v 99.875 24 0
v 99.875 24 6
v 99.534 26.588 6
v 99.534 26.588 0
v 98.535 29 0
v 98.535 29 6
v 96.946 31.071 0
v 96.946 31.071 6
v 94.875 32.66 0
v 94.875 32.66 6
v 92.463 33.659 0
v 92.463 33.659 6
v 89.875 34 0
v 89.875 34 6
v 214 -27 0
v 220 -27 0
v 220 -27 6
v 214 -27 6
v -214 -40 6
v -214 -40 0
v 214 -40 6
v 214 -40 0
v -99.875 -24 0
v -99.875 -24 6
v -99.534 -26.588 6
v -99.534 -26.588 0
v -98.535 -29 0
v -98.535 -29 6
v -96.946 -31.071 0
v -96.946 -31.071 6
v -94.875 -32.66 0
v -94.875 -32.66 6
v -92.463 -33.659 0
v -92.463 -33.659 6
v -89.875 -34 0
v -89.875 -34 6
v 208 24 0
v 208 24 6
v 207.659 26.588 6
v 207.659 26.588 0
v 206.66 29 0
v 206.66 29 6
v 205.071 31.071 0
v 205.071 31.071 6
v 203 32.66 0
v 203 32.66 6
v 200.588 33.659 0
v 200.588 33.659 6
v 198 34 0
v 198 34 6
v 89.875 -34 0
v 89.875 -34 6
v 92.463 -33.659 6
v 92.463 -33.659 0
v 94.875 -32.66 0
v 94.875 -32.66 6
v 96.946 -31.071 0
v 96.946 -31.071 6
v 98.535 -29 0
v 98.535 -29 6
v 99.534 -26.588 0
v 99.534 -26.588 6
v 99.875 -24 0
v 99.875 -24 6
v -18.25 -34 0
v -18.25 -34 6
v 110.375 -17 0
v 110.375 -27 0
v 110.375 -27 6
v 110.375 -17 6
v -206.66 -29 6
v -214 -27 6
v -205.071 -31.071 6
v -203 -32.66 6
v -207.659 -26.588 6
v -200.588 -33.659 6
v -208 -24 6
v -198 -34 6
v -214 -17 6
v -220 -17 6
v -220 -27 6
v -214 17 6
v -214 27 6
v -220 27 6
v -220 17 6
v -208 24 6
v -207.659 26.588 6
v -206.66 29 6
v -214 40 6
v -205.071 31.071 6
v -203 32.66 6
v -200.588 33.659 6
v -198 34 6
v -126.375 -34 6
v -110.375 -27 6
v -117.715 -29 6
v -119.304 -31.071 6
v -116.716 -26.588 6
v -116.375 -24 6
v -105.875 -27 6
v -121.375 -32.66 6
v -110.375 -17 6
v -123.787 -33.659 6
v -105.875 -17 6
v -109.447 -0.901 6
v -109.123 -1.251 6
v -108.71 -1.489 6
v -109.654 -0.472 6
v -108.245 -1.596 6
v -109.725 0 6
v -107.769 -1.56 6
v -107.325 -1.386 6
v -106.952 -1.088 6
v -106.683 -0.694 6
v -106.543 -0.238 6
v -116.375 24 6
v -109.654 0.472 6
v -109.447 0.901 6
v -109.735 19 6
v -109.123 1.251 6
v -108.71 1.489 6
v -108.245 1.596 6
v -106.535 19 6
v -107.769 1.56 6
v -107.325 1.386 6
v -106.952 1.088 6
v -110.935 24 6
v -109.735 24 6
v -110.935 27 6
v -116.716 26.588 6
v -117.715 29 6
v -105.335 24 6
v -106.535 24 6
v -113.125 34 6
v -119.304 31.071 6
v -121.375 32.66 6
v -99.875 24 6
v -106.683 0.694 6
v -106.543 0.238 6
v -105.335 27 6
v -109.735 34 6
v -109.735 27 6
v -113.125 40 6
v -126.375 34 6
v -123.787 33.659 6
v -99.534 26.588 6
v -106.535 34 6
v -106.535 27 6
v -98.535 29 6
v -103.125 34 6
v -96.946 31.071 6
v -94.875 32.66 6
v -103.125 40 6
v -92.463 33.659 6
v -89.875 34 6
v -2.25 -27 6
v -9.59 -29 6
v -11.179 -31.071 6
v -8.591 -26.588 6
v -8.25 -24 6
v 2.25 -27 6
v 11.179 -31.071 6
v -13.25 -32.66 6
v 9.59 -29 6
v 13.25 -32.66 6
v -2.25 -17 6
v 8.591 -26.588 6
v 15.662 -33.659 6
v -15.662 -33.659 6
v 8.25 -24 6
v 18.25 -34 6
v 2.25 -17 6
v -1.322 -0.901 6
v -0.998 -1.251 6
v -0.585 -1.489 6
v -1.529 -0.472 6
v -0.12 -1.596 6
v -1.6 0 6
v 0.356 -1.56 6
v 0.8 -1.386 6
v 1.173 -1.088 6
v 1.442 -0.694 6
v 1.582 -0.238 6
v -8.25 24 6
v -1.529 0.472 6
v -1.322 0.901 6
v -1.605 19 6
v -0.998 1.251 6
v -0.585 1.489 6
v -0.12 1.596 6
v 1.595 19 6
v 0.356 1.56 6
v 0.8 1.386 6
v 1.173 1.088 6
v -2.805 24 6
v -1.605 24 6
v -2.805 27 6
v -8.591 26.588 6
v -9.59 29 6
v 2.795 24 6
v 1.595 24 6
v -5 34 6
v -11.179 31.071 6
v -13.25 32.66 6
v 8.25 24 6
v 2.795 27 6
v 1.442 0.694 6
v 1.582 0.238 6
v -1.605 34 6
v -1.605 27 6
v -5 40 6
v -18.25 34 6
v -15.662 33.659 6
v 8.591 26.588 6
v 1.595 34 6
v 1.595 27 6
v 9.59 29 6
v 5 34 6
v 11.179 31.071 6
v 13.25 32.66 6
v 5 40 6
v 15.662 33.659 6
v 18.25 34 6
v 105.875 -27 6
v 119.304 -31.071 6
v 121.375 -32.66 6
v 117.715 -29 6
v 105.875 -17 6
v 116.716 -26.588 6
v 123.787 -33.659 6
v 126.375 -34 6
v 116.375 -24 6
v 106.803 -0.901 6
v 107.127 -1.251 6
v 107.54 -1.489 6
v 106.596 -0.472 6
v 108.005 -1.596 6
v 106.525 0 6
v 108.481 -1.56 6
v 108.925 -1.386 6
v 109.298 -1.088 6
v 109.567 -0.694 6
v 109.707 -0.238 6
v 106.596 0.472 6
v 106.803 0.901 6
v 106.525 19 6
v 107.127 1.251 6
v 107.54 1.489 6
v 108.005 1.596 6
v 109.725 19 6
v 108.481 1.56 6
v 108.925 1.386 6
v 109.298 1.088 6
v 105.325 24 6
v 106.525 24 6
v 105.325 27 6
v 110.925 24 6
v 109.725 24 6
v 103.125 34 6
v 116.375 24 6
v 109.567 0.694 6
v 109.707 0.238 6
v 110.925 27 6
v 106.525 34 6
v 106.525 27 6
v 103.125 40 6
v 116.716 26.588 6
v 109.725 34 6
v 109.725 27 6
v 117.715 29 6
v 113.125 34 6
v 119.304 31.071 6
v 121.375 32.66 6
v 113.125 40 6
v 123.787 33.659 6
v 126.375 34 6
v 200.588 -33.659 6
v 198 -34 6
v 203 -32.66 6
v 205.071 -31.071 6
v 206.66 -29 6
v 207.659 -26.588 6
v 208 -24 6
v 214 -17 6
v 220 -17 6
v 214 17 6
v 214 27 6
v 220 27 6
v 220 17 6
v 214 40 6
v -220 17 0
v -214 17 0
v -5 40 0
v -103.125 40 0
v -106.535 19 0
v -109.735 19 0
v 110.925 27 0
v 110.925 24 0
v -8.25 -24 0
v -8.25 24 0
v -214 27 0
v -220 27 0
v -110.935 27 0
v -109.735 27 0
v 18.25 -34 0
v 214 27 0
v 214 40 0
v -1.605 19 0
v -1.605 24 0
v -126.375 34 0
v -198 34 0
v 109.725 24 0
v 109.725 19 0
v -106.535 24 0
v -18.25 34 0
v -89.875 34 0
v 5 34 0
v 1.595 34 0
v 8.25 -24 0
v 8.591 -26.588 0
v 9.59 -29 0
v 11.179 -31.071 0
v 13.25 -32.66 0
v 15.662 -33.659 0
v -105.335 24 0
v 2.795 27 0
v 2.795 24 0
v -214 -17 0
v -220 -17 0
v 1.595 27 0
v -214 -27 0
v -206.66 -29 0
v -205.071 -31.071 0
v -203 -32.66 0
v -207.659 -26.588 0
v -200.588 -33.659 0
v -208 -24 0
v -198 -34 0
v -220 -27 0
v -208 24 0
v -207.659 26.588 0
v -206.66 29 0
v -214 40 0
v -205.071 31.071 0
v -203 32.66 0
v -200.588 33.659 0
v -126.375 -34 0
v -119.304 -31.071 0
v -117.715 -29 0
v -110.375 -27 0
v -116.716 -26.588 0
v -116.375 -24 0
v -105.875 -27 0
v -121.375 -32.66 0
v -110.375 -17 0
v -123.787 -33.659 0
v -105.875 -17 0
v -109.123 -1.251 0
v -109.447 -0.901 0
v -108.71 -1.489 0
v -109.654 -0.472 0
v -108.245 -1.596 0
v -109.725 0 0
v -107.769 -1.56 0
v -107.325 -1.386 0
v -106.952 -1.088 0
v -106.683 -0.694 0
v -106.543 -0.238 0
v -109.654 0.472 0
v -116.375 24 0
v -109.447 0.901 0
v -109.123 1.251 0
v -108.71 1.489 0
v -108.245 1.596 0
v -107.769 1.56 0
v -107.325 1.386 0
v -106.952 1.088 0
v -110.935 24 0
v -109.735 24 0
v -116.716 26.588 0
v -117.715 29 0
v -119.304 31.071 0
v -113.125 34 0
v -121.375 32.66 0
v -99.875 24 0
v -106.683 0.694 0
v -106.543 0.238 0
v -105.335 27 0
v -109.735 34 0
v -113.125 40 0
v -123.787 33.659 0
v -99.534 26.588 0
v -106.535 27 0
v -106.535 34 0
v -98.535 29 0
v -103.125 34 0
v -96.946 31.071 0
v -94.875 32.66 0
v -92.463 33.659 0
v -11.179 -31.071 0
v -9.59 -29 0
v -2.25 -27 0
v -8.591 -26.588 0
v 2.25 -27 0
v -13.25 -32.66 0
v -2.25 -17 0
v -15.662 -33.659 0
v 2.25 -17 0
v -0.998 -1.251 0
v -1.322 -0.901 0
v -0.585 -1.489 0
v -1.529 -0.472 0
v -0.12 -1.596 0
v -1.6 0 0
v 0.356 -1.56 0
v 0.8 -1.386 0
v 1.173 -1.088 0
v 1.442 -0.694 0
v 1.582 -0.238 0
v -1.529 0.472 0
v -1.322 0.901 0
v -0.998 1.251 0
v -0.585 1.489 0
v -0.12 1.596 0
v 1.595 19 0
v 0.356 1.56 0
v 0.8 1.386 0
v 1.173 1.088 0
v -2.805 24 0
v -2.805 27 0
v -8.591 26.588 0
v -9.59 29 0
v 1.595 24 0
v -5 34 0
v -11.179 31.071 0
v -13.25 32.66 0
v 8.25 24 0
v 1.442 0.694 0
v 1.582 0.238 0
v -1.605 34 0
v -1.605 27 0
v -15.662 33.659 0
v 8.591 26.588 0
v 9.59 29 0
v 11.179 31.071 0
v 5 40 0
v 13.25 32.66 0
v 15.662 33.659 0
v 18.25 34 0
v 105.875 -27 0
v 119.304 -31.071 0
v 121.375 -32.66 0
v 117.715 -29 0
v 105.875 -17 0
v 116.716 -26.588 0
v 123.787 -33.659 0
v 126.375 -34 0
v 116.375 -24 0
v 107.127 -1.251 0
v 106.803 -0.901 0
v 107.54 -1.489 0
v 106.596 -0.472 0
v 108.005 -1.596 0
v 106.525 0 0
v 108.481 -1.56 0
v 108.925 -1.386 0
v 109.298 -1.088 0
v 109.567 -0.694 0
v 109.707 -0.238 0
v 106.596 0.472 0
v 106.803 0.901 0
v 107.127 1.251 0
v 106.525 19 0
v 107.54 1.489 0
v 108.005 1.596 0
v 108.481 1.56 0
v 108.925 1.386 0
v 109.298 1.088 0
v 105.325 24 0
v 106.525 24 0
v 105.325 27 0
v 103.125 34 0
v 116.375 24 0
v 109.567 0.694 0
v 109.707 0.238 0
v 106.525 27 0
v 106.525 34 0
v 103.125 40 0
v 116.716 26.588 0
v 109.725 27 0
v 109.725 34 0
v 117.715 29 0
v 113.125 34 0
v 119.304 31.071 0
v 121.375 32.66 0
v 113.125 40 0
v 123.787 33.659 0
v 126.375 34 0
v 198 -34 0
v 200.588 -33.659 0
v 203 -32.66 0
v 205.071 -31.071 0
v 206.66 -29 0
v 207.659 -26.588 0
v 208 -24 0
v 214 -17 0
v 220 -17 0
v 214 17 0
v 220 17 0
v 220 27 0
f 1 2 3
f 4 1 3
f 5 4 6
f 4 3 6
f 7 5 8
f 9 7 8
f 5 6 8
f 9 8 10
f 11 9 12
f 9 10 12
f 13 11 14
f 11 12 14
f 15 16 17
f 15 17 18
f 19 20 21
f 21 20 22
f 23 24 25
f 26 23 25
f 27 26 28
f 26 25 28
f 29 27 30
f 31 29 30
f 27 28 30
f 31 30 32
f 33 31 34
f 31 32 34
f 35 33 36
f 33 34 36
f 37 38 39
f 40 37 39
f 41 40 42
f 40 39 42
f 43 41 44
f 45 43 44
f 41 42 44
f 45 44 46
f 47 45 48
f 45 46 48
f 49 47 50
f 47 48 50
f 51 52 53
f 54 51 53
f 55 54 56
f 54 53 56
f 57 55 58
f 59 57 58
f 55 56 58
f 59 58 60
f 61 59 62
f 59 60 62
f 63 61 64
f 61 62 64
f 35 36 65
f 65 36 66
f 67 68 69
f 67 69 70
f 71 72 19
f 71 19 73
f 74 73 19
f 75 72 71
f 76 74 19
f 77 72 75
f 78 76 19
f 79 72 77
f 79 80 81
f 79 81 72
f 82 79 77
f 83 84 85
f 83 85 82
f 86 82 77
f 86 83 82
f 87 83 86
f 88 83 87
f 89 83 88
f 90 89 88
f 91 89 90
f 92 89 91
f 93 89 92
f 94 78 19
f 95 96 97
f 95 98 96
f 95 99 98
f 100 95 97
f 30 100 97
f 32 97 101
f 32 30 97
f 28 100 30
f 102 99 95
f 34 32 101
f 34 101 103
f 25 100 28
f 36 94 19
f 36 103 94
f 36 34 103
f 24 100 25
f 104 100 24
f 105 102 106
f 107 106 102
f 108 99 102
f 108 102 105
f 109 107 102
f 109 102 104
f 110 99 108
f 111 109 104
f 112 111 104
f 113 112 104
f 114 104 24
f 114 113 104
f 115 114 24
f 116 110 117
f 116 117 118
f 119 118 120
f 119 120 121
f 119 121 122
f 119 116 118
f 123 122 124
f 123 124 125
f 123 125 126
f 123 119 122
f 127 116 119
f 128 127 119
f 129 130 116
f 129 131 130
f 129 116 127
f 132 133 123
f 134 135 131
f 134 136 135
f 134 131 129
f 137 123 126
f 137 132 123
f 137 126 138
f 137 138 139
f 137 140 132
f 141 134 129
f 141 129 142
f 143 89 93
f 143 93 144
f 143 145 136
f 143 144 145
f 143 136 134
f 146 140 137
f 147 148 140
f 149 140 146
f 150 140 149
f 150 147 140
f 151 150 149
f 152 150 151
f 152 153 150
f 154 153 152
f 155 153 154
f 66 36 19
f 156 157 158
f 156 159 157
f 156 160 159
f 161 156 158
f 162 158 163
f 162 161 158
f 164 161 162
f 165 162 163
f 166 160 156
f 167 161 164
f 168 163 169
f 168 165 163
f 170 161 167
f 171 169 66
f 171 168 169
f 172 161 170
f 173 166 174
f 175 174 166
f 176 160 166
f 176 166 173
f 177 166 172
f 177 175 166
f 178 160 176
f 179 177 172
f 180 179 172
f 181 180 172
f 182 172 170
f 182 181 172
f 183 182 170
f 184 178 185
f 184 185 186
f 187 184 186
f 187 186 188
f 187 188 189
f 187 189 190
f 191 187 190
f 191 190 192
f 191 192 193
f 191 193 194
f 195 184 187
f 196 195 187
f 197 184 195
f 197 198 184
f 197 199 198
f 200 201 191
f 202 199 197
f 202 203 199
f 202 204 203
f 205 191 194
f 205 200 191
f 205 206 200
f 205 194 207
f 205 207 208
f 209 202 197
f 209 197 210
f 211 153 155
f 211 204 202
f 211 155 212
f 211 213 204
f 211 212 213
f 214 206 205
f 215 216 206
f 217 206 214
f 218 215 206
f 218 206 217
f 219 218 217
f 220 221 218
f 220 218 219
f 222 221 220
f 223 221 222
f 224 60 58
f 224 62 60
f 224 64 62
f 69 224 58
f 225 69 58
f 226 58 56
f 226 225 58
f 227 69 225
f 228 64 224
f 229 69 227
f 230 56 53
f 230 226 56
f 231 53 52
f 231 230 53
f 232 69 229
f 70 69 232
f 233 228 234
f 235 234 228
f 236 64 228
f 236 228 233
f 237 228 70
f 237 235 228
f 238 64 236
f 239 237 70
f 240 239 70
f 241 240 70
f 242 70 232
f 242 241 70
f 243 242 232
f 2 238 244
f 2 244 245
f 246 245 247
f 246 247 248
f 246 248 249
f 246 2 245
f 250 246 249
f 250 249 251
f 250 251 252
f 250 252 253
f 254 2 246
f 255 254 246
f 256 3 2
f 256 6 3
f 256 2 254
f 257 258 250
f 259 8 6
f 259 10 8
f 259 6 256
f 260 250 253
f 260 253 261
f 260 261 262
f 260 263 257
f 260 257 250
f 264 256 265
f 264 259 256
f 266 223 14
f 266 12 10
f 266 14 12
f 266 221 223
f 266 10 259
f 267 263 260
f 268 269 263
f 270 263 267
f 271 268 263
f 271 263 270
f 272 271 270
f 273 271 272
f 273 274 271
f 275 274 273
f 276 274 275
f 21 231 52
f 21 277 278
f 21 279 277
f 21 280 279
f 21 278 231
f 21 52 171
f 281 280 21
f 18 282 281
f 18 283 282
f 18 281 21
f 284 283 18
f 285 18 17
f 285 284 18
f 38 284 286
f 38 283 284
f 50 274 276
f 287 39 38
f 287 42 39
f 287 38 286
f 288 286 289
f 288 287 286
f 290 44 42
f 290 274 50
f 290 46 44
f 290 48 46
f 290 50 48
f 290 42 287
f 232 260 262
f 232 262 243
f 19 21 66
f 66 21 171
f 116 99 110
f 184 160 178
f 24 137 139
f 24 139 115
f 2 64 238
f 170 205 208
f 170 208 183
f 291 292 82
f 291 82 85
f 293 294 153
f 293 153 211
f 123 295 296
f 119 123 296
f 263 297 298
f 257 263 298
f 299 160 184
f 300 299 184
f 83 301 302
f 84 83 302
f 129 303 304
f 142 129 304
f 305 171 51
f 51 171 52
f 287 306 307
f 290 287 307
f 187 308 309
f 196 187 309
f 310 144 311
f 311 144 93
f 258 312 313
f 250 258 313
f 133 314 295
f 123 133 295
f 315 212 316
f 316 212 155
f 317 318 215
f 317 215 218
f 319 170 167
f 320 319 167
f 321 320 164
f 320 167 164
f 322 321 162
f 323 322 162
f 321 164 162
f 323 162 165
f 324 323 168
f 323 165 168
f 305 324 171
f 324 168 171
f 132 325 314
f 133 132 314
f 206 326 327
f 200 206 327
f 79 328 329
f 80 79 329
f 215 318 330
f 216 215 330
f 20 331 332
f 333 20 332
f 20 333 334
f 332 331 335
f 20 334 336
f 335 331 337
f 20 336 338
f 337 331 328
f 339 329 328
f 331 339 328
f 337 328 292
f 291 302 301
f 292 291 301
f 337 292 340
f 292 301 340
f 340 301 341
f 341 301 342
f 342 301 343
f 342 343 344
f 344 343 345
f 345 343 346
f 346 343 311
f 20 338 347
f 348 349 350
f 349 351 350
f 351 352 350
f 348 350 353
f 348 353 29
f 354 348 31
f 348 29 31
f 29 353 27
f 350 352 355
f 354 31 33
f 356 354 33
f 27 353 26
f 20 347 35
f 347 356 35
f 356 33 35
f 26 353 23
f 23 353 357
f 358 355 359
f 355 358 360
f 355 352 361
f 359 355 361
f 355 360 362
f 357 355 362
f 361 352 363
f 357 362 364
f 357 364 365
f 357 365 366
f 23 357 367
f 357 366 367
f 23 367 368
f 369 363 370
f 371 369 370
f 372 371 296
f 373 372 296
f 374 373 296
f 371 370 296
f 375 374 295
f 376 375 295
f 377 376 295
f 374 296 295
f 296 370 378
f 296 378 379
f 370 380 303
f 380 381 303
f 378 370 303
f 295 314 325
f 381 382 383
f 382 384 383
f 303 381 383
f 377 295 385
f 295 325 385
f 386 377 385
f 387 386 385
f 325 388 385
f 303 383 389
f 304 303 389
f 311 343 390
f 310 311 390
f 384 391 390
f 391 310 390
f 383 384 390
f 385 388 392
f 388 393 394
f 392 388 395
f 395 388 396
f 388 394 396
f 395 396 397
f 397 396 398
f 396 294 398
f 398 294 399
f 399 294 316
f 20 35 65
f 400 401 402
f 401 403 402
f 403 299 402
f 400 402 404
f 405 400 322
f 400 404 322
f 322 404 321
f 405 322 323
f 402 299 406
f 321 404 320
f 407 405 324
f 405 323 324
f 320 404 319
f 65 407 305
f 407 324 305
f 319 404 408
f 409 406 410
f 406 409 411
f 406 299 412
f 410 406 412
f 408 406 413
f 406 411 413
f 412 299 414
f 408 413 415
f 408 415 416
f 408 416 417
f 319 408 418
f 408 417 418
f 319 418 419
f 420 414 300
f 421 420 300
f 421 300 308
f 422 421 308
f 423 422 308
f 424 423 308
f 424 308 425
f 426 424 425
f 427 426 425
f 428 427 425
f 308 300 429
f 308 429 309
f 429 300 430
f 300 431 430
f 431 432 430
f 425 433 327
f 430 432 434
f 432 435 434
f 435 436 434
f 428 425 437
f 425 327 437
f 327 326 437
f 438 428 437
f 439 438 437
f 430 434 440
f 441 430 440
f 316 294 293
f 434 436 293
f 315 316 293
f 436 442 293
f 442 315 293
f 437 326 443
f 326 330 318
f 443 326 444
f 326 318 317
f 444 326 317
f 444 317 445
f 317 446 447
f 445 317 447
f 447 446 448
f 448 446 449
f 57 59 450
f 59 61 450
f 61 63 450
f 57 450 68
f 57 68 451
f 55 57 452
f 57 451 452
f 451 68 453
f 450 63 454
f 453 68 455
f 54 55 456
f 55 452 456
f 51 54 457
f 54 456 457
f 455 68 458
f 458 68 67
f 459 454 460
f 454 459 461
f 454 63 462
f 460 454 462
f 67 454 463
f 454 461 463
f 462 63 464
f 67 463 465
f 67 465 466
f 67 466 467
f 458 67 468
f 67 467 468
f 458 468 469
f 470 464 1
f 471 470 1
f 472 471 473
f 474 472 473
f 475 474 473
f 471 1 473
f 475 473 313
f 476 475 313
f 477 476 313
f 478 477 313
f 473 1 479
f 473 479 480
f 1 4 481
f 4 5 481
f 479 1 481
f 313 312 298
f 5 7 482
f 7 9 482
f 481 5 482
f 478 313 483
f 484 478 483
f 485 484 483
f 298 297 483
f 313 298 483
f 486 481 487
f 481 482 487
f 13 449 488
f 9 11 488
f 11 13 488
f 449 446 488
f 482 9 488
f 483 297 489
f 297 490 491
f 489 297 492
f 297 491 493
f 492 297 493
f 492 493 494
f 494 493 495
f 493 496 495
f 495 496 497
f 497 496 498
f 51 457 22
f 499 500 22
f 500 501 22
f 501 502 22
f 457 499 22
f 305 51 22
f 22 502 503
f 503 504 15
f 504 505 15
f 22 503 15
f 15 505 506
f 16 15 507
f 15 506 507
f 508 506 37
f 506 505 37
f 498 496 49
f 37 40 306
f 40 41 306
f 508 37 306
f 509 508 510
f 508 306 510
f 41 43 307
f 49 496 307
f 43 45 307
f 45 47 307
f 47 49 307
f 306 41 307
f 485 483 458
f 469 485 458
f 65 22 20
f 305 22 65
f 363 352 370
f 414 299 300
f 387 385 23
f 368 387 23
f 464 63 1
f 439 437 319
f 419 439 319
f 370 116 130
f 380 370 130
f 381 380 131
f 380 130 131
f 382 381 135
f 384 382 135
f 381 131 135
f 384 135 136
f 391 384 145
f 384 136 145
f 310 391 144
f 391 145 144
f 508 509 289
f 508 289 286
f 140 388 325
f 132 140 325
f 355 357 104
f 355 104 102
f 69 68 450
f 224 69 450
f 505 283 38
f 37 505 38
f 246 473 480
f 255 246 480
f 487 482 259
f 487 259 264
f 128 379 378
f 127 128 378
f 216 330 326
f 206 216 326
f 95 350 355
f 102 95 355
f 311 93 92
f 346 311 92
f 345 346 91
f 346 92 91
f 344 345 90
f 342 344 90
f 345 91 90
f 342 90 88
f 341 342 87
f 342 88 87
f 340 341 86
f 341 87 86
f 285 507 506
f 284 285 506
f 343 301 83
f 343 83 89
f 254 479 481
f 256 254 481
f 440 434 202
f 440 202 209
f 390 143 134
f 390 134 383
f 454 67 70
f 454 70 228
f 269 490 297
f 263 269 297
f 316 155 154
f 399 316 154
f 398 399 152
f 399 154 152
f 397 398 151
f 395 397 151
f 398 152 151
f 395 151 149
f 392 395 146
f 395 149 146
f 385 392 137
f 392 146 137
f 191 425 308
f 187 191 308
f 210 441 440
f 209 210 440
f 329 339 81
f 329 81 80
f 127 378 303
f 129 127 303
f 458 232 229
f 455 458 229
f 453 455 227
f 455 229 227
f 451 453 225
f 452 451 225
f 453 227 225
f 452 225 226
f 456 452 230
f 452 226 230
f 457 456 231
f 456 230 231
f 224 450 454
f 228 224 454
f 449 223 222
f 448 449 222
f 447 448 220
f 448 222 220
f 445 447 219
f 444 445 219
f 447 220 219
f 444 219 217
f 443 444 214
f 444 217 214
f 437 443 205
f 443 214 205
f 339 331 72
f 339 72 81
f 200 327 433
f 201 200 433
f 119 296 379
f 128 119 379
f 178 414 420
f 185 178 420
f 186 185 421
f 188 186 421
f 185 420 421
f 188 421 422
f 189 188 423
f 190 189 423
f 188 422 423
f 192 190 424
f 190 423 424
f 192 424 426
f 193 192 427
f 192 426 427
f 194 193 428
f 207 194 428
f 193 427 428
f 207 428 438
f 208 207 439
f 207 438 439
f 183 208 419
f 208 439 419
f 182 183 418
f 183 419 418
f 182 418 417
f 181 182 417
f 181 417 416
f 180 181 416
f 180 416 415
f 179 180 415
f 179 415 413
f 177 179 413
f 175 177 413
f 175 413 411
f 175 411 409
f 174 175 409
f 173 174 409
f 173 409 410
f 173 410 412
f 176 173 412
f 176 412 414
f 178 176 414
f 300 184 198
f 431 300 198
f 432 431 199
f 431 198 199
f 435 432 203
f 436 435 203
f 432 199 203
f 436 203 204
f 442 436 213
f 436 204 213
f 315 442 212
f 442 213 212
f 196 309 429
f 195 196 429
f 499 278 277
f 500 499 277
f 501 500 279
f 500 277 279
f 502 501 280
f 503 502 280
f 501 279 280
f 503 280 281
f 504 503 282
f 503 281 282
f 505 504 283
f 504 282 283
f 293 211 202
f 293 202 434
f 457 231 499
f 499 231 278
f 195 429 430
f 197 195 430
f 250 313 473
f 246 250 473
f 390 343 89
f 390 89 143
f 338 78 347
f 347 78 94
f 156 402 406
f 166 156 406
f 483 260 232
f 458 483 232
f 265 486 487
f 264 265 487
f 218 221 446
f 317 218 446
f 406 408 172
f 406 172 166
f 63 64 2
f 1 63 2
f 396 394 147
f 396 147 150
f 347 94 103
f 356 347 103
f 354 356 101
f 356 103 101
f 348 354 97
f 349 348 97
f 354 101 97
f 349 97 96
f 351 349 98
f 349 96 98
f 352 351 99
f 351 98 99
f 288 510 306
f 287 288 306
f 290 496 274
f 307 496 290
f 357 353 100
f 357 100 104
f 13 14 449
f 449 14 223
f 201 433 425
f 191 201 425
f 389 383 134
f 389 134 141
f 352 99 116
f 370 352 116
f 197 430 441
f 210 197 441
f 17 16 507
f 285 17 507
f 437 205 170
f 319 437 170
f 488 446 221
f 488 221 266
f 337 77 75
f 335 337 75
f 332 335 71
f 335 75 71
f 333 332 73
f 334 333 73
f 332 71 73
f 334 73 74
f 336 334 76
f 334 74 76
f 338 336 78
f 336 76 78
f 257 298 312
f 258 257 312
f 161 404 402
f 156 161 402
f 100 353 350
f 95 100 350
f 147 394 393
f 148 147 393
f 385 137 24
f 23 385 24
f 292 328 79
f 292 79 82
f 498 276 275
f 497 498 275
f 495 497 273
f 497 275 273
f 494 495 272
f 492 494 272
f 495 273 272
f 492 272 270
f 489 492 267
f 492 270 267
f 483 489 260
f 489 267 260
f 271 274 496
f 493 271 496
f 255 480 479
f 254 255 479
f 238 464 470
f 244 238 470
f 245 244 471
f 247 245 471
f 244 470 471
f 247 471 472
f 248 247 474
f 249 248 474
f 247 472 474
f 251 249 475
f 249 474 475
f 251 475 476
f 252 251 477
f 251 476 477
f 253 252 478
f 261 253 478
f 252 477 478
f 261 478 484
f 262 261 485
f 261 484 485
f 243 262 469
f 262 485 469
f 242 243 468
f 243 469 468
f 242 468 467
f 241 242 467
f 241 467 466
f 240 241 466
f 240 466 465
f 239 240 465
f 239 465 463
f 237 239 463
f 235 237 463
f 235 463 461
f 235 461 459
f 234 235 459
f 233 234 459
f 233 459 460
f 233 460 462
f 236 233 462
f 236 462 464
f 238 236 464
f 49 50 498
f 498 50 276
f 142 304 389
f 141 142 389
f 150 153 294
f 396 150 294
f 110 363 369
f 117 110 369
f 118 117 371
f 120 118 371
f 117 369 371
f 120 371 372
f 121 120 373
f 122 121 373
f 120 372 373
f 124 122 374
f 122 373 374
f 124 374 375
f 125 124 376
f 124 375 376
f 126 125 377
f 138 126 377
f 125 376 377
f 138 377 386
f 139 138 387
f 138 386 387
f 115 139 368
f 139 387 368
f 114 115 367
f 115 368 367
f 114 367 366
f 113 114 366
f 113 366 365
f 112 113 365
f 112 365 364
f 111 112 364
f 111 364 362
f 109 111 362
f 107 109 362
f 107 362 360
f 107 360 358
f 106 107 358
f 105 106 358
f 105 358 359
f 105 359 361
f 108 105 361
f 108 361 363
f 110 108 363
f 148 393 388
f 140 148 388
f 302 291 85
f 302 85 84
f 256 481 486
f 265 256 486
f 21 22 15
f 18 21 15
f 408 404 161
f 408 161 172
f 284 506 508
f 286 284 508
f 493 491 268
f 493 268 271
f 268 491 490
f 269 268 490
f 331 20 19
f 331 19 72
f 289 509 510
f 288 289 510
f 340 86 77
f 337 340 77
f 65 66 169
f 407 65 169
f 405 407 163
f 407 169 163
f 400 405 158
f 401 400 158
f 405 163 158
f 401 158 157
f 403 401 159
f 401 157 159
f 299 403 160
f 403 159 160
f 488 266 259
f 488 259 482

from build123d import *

# Parameters (mm, degrees)
SKETCH1_W           = 428
SKETCH1_H           = 80
BOSS_EXTRUDE1_DEPTH = 6
CUT_EXTRUDE1_DEPTH  = 6
LPATTERN1_COUNT     = 4
LPATTERN1_PITCH     = 108.125
SKETCH3_R           = 1.6
SKETCH3_W           = 4.5
SKETCH3_H           = 10
CUT_EXTRUDE2_DEPTH  = 7
SKETCH4_W           = 6
SKETCH4_H           = 10
BOSS_EXTRUDE2_DEPTH = 6
SKETCH5_W           = 10
SKETCH5_H           = 6
CUT_EXTRUDE3_DEPTH  = 6
CUT_EXTRUDE4_REACH  = 8


with BuildPart() as part:
    # Sketch1 → Boss-Extrude1 (new body)
    with BuildSketch(Plane.XY):
        Rectangle(SKETCH1_W, SKETCH1_H)
    extrude(amount=BOSS_EXTRUDE1_DEPTH)

    # Sketch2 → Cut-Extrude1 (cut)
    with BuildSketch(Plane.XY.offset(6)):
        with BuildLine():
            Line((-116.375, -24), (-116.375, 24))
            ThreePointArc((-116.375, 24), (-119.303932188, 31.071067812), (-126.375, 34))
            Line((-126.375, 34), (-198, 34))
            ThreePointArc((-198, 34), (-205.071067812, 31.071067812), (-208, 24))
            Line((-208, 24), (-208, -24))
            ThreePointArc((-208, -24), (-205.071067812, -31.071067812), (-198, -34))
            Line((-198, -34), (-126.375, -34))
            ThreePointArc((-126.375, -34), (-119.303932188, -31.071067812), (-116.375, -24))
        make_face()
    cut_extrude1 = extrude(amount=-CUT_EXTRUDE1_DEPTH, mode=Mode.SUBTRACT)

    # LPattern1: Cut-Extrude1 ×4
    with Locations(*[(i * LPATTERN1_PITCH, 0, 0) for i in range(1, LPATTERN1_COUNT)]):
        add(cut_extrude1, mode=Mode.SUBTRACT)

    # Sketch3 → Cut-Extrude2 (cut, through all)
    with BuildSketch(Plane(origin=(0, 0, 0), x_dir=(-1, 0, 0), z_dir=(0, 0, -1))):
        with Locations((108.125, 0)):
            Circle(SKETCH3_R)
        Circle(SKETCH3_R)
        with Locations((-108.125, 0)):
            Circle(SKETCH3_R)
        with Locations((-108.125, -22)):
            Rectangle(SKETCH3_W, SKETCH3_H)
        with Locations((0, -22)):
            Rectangle(SKETCH3_W, SKETCH3_H)
        with Locations((108.125, -22)):
            Rectangle(SKETCH3_W, SKETCH3_H)
    extrude(amount=-CUT_EXTRUDE2_DEPTH, mode=Mode.SUBTRACT)

    # Sketch4 → Boss-Extrude2 (add)
    with BuildSketch(Plane(origin=(0, 0, 0), x_dir=(-1, 0, 0), z_dir=(0, 0, -1))):
        with Locations((-217, 22)):
            Rectangle(SKETCH4_W, SKETCH4_H)
        with Locations((-217, -22)):
            Rectangle(SKETCH4_W, SKETCH4_H)
        with Locations((217, -22)):
            Rectangle(SKETCH4_W, SKETCH4_H)
        with Locations((217, 22)):
            Rectangle(SKETCH4_W, SKETCH4_H)
    extrude(amount=-BOSS_EXTRUDE2_DEPTH)

    # Sketch5 → Cut-Extrude3 (cut)
    with BuildSketch(Plane(origin=(0, 40, 0), x_dir=(1, 0, 0), z_dir=(0, 1, 0))):
        with Locations((-108.125, -3)):
            Rectangle(SKETCH5_W, SKETCH5_H)
        with Locations((0, -3)):
            Rectangle(SKETCH5_W, SKETCH5_H)
        with Locations((108.125, -3)):
            Rectangle(SKETCH5_W, SKETCH5_H)
    extrude(amount=-CUT_EXTRUDE3_DEPTH, mode=Mode.SUBTRACT)

    # Sketch6 → Cut-Extrude4 (cut, up to next)
    with BuildSketch(Plane(origin=(0, 0, 0), x_dir=(-1, 0, 0), z_dir=(0, 0, -1)), mode=Mode.PRIVATE) as cut_extrude4_sk1:
        Polygon((-109.725, 34), (-109.725, 27), (-110.925, 27), (-110.925, 24), (-109.725, 24), (-109.725, 19), (-106.525, 19), (-106.525, 24), (-105.325, 24), (-105.325, 27), (-106.525, 27), (-106.525, 34), align=None)
    cut_extrude4_tool1 = extrude(cut_extrude4_sk1.sketch, amount=-CUT_EXTRUDE4_REACH, mode=Mode.PRIVATE) & part.part
    add(cut_extrude4_tool1.solids().sort_by_distance((108.125, 26.369565, 0))[0], mode=Mode.SUBTRACT)
    # Sketch6 → Cut-Extrude4 (cut, up to next)
    with BuildSketch(Plane(origin=(0, 0, 0), x_dir=(-1, 0, 0), z_dir=(0, 0, -1)), mode=Mode.PRIVATE) as cut_extrude4_sk2:
        Polygon((-1.595, 27), (-2.795, 27), (-2.795, 24), (-1.595, 24), (-1.595, 19), (1.605, 19), (1.605, 24), (2.805, 24), (2.805, 27), (1.605, 27), (1.605, 34), (-1.595, 34), align=None)
    cut_extrude4_tool2 = extrude(cut_extrude4_sk2.sketch, amount=-CUT_EXTRUDE4_REACH, mode=Mode.PRIVATE) & part.part
    add(cut_extrude4_tool2.solids().sort_by_distance((-0.005, 26.369565, 0))[0], mode=Mode.SUBTRACT)
    # Sketch6 → Cut-Extrude4 (cut, up to next)
    with BuildSketch(Plane(origin=(0, 0, 0), x_dir=(-1, 0, 0), z_dir=(0, 0, -1)), mode=Mode.PRIVATE) as cut_extrude4_sk3:
        Polygon((106.535, 34), (106.535, 27), (105.335, 27), (105.335, 24), (106.535, 24), (106.535, 19), (109.735, 19), (109.735, 24), (110.935, 24), (110.935, 27), (109.735, 27), (109.735, 34), align=None)
    cut_extrude4_tool3 = extrude(cut_extrude4_sk3.sketch, amount=-CUT_EXTRUDE4_REACH, mode=Mode.PRIVATE) & part.part
    add(cut_extrude4_tool3.solids().sort_by_distance((-108.135, 26.369565, 0))[0], mode=Mode.SUBTRACT)


solid = part.part
